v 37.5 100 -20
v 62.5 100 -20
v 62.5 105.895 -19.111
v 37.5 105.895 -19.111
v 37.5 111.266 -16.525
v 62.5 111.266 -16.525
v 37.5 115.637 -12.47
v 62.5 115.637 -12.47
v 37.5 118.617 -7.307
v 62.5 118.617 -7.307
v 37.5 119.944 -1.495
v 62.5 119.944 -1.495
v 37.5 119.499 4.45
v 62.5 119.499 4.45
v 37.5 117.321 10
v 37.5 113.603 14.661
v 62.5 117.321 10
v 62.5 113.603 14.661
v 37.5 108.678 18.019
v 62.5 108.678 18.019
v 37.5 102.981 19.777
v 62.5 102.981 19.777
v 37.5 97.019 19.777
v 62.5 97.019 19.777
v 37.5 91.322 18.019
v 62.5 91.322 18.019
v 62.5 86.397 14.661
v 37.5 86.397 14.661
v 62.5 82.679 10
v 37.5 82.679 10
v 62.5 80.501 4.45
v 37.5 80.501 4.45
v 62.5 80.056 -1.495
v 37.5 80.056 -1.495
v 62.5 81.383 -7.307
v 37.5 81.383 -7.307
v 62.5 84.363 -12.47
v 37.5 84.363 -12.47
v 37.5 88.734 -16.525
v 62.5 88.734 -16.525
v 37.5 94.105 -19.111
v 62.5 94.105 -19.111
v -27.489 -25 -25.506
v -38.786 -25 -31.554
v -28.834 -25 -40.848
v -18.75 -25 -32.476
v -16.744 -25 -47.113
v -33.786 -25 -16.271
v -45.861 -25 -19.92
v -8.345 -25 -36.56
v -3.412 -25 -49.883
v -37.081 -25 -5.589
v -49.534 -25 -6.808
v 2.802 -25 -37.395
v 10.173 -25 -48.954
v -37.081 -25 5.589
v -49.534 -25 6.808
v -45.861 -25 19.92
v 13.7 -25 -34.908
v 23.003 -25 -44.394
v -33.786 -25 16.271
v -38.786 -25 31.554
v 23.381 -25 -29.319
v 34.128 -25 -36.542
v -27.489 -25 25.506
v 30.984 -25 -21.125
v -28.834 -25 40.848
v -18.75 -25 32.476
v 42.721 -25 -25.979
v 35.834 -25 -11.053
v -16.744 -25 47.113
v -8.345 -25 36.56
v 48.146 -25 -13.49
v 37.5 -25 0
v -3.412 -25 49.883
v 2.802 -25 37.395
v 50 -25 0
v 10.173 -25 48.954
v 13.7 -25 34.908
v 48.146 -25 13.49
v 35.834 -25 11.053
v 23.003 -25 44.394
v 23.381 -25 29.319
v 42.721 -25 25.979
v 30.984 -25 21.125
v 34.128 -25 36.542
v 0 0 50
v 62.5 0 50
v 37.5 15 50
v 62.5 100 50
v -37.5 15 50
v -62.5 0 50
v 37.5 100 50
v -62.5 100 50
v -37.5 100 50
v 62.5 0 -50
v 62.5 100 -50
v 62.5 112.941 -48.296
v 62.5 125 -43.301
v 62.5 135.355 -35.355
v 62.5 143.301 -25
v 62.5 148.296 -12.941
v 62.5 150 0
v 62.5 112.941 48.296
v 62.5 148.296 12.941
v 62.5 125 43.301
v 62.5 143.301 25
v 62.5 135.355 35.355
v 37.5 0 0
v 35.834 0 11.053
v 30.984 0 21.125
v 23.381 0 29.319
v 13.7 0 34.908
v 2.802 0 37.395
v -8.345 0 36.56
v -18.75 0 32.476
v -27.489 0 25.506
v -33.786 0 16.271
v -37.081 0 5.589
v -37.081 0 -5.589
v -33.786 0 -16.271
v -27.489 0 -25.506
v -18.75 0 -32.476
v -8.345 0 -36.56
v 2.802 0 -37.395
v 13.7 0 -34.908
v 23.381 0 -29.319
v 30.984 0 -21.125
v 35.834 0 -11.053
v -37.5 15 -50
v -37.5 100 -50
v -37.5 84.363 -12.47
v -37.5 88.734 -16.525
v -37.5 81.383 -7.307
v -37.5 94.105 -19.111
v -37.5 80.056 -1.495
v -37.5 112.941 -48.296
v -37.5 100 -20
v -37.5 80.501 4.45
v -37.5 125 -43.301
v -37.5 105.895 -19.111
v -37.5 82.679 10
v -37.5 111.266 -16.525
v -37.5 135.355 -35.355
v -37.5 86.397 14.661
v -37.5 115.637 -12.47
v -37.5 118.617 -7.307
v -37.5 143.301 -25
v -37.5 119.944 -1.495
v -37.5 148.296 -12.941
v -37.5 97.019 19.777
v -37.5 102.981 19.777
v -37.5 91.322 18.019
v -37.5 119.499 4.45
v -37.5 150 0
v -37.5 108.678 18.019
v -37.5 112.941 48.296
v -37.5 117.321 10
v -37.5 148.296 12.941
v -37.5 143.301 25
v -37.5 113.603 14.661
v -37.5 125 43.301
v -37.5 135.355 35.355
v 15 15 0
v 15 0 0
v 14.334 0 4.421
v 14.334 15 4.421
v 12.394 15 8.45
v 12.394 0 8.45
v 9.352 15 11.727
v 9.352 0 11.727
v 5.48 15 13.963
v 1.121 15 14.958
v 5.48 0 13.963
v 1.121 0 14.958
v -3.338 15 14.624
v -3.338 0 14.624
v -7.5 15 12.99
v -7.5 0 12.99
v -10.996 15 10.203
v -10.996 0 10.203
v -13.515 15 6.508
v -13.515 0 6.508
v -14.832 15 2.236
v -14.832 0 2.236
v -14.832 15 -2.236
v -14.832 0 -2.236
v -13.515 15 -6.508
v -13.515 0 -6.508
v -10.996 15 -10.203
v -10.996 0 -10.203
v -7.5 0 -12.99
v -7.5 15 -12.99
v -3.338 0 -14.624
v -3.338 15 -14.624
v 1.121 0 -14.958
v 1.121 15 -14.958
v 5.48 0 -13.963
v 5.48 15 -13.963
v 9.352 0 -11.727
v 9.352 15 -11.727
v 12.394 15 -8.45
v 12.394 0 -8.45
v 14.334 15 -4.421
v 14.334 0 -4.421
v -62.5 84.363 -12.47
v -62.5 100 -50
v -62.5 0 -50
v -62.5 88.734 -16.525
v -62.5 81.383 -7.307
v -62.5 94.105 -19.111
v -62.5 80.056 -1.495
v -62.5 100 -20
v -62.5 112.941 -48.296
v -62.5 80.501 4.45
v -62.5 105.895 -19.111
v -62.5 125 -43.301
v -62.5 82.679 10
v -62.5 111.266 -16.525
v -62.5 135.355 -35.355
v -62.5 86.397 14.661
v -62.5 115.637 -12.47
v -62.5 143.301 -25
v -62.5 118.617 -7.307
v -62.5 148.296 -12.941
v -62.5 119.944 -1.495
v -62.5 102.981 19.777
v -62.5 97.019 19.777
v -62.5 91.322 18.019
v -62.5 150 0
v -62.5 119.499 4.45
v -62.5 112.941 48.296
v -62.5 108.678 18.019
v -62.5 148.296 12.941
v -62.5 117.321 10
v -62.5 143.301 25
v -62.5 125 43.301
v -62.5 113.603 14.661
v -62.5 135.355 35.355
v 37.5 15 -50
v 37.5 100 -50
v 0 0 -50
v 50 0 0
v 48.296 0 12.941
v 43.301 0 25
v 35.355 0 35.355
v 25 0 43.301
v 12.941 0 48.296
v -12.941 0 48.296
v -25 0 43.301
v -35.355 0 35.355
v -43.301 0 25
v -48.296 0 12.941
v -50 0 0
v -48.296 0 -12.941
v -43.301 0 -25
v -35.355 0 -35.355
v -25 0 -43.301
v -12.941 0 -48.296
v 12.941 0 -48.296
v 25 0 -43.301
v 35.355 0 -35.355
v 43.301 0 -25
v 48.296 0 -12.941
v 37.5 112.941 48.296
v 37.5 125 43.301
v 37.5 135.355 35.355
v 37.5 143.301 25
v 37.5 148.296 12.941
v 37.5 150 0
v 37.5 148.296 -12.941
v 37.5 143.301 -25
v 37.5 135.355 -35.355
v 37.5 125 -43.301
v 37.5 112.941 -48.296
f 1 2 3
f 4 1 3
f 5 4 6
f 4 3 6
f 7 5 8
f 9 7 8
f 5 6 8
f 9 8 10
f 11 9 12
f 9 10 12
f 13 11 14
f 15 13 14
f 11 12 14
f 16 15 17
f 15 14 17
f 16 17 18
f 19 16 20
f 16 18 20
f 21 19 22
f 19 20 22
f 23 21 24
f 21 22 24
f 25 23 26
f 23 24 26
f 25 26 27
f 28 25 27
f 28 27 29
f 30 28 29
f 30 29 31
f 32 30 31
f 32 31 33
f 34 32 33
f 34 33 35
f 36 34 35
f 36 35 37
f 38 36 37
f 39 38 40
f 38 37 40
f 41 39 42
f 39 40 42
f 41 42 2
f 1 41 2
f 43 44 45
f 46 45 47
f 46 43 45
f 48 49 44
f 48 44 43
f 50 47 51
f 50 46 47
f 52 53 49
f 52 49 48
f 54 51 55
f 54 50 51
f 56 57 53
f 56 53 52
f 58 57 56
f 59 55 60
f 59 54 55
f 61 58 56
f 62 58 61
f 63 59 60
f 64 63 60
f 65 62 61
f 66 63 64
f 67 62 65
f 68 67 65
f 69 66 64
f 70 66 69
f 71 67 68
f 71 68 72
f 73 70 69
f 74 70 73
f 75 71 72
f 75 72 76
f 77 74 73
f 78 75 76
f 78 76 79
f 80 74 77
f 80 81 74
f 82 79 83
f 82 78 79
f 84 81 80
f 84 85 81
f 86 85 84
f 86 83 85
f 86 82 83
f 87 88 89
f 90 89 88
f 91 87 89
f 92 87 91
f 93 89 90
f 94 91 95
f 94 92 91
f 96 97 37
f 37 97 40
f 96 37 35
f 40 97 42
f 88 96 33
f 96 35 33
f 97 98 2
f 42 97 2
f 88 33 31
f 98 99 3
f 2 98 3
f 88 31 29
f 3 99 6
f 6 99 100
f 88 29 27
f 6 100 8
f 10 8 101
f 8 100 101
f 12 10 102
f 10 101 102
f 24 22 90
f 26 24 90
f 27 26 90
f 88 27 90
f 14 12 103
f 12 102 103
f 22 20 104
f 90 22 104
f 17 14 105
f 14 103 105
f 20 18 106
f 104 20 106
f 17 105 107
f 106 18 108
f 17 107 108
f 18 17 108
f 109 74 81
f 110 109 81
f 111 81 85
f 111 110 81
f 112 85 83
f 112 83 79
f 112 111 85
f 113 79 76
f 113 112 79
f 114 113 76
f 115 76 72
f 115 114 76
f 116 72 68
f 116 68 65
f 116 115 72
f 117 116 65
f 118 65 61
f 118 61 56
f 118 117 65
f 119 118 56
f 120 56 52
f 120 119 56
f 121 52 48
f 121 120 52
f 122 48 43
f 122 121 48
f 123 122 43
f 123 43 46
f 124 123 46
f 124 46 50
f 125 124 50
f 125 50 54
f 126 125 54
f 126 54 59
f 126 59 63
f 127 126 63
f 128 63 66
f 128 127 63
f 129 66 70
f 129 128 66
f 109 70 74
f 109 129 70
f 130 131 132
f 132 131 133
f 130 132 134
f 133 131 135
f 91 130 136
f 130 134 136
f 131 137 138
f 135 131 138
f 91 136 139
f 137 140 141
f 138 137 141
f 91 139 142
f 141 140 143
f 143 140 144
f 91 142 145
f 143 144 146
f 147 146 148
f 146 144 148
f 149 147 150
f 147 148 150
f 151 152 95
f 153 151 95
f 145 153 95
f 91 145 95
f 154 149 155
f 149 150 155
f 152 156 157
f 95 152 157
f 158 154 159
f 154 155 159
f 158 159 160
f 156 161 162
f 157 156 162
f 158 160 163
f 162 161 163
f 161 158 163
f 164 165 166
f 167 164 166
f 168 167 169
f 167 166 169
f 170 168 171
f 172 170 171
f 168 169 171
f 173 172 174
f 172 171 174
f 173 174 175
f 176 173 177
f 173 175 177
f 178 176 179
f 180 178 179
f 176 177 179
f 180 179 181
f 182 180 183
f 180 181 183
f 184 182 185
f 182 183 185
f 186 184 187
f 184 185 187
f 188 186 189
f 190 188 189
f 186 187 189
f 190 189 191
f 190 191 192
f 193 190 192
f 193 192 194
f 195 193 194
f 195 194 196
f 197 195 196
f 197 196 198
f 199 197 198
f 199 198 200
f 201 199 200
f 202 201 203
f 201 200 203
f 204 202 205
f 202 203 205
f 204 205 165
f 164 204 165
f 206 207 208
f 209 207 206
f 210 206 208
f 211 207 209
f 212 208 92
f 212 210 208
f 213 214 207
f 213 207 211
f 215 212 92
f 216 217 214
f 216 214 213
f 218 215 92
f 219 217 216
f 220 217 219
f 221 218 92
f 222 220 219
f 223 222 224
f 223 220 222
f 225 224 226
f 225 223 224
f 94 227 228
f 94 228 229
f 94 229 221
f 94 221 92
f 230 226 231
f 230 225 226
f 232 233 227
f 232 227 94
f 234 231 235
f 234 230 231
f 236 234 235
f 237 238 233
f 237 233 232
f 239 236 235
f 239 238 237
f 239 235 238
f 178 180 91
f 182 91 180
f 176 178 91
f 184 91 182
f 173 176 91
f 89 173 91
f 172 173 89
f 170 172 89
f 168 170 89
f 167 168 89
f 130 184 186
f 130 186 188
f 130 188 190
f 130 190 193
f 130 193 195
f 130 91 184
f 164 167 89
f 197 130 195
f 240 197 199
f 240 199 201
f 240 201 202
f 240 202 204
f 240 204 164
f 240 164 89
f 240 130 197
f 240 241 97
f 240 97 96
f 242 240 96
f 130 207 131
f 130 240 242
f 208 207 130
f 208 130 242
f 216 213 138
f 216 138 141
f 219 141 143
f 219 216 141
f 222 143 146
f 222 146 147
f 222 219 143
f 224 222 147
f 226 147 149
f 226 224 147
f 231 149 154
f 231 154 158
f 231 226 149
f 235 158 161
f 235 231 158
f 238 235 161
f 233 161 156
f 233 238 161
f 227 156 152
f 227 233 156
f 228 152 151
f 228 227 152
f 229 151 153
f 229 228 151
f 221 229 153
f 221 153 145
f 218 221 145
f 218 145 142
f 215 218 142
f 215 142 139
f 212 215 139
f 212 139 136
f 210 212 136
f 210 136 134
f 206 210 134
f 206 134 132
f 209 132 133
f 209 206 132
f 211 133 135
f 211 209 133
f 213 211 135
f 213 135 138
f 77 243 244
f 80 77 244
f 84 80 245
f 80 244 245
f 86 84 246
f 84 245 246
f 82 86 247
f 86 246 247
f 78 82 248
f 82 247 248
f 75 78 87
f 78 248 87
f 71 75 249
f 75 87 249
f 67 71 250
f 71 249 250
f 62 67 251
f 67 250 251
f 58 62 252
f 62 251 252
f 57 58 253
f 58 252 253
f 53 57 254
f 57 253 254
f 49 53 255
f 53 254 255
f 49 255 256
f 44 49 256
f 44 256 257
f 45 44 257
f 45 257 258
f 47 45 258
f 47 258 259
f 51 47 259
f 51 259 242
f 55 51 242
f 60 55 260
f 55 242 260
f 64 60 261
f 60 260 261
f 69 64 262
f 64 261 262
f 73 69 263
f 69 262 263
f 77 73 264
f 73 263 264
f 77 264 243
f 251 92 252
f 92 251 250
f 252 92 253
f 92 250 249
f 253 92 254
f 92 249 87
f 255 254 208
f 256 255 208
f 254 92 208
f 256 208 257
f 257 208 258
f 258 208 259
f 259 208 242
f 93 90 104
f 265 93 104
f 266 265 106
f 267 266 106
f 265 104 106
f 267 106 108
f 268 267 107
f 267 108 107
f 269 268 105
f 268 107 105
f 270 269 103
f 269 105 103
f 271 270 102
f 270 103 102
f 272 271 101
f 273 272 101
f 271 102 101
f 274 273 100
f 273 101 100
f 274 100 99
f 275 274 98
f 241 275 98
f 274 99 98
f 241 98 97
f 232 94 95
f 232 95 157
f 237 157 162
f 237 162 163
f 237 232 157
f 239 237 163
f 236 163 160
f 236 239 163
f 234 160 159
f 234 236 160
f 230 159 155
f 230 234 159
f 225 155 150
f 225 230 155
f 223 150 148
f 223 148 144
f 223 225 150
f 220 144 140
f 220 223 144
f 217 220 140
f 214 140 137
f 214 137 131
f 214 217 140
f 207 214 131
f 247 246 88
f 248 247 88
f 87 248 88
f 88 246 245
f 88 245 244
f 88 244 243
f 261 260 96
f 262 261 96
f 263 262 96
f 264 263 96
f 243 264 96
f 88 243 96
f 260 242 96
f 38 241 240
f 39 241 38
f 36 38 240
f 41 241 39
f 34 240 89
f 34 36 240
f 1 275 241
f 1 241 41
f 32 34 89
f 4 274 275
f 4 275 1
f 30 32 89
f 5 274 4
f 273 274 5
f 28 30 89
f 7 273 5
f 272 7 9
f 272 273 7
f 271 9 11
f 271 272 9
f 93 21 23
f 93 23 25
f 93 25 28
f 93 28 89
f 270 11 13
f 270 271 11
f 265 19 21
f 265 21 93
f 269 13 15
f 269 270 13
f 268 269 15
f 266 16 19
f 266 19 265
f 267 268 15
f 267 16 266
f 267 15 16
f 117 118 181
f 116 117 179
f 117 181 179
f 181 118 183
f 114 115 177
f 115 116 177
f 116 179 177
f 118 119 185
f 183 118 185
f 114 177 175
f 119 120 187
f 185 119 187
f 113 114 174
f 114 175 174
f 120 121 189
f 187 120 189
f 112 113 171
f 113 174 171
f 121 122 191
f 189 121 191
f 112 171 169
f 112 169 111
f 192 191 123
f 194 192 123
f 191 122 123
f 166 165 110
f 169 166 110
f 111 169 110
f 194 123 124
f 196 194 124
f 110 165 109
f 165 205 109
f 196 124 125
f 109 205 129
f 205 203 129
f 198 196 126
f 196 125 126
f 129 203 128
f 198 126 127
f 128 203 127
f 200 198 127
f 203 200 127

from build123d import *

# Parameters (mm, degrees)
SKETCH1_W           = 125
SKETCH1_H           = 100
BOSS_EXTRUDE1_DEPTH = 15
SKETCH2_R           = 50
SKETCH2_R_2         = 37.5
BOSS_EXTRUDE2_DEPTH = 25
SKETCH5_R           = 20
BOSS_EXTRUDE3_DEPTH = 25
SKETCH6_R           = 15
CUT_EXTRUDE2_DEPTH  = 15


with BuildPart() as part:
    # Sketch1 → Boss-Extrude1 (new body)
    with BuildSketch(Plane(origin=(0, 0, 0), x_dir=(1, 0, 0), z_dir=(0, 1, 0))):
        Rectangle(SKETCH1_W, SKETCH1_H)
    boss_extrude1 = extrude(amount=BOSS_EXTRUDE1_DEPTH)

    # Sketch2 → Boss-Extrude2 (add)
    with BuildSketch(Plane.XZ):
        Circle(SKETCH2_R)
        Circle(SKETCH2_R_2, mode=Mode.SUBTRACT)
    extrude(amount=BOSS_EXTRUDE2_DEPTH)

    # Sketch5 → Boss-Extrude3 (add)
    with BuildSketch(Plane(origin=(62.5, 0, 0), x_dir=(0, 0, -1), z_dir=(1, 0, 0))):
        with BuildLine():
            ThreePointArc((-50, 100), (0, 150), (50, 100))
            Line((50, 100), (50, 15))
            Line((50, 15), (-50, 15))
            Line((-50, 15), (-50, 100))
        make_face()
        with Locations((0, 100)):
            Circle(SKETCH5_R, mode=Mode.SUBTRACT)
    boss_extrude3 = extrude(amount=-BOSS_EXTRUDE3_DEPTH)

    # Mirror1: Boss-Extrude1, Boss-Extrude3 across plane
    add(boss_extrude1.mirror(Plane(origin=(0, 0, 0), x_dir=(0, 0, 1), z_dir=(1, 0, 0))))
    add(boss_extrude3.mirror(Plane(origin=(0, 0, 0), x_dir=(0, 0, 1), z_dir=(1, 0, 0))))

    # Sketch6 → Cut-Extrude2 (cut)
    with BuildSketch(Plane.XZ):
        Circle(SKETCH6_R)
    extrude(amount=-CUT_EXTRUDE2_DEPTH, mode=Mode.SUBTRACT)


solid = part.part
